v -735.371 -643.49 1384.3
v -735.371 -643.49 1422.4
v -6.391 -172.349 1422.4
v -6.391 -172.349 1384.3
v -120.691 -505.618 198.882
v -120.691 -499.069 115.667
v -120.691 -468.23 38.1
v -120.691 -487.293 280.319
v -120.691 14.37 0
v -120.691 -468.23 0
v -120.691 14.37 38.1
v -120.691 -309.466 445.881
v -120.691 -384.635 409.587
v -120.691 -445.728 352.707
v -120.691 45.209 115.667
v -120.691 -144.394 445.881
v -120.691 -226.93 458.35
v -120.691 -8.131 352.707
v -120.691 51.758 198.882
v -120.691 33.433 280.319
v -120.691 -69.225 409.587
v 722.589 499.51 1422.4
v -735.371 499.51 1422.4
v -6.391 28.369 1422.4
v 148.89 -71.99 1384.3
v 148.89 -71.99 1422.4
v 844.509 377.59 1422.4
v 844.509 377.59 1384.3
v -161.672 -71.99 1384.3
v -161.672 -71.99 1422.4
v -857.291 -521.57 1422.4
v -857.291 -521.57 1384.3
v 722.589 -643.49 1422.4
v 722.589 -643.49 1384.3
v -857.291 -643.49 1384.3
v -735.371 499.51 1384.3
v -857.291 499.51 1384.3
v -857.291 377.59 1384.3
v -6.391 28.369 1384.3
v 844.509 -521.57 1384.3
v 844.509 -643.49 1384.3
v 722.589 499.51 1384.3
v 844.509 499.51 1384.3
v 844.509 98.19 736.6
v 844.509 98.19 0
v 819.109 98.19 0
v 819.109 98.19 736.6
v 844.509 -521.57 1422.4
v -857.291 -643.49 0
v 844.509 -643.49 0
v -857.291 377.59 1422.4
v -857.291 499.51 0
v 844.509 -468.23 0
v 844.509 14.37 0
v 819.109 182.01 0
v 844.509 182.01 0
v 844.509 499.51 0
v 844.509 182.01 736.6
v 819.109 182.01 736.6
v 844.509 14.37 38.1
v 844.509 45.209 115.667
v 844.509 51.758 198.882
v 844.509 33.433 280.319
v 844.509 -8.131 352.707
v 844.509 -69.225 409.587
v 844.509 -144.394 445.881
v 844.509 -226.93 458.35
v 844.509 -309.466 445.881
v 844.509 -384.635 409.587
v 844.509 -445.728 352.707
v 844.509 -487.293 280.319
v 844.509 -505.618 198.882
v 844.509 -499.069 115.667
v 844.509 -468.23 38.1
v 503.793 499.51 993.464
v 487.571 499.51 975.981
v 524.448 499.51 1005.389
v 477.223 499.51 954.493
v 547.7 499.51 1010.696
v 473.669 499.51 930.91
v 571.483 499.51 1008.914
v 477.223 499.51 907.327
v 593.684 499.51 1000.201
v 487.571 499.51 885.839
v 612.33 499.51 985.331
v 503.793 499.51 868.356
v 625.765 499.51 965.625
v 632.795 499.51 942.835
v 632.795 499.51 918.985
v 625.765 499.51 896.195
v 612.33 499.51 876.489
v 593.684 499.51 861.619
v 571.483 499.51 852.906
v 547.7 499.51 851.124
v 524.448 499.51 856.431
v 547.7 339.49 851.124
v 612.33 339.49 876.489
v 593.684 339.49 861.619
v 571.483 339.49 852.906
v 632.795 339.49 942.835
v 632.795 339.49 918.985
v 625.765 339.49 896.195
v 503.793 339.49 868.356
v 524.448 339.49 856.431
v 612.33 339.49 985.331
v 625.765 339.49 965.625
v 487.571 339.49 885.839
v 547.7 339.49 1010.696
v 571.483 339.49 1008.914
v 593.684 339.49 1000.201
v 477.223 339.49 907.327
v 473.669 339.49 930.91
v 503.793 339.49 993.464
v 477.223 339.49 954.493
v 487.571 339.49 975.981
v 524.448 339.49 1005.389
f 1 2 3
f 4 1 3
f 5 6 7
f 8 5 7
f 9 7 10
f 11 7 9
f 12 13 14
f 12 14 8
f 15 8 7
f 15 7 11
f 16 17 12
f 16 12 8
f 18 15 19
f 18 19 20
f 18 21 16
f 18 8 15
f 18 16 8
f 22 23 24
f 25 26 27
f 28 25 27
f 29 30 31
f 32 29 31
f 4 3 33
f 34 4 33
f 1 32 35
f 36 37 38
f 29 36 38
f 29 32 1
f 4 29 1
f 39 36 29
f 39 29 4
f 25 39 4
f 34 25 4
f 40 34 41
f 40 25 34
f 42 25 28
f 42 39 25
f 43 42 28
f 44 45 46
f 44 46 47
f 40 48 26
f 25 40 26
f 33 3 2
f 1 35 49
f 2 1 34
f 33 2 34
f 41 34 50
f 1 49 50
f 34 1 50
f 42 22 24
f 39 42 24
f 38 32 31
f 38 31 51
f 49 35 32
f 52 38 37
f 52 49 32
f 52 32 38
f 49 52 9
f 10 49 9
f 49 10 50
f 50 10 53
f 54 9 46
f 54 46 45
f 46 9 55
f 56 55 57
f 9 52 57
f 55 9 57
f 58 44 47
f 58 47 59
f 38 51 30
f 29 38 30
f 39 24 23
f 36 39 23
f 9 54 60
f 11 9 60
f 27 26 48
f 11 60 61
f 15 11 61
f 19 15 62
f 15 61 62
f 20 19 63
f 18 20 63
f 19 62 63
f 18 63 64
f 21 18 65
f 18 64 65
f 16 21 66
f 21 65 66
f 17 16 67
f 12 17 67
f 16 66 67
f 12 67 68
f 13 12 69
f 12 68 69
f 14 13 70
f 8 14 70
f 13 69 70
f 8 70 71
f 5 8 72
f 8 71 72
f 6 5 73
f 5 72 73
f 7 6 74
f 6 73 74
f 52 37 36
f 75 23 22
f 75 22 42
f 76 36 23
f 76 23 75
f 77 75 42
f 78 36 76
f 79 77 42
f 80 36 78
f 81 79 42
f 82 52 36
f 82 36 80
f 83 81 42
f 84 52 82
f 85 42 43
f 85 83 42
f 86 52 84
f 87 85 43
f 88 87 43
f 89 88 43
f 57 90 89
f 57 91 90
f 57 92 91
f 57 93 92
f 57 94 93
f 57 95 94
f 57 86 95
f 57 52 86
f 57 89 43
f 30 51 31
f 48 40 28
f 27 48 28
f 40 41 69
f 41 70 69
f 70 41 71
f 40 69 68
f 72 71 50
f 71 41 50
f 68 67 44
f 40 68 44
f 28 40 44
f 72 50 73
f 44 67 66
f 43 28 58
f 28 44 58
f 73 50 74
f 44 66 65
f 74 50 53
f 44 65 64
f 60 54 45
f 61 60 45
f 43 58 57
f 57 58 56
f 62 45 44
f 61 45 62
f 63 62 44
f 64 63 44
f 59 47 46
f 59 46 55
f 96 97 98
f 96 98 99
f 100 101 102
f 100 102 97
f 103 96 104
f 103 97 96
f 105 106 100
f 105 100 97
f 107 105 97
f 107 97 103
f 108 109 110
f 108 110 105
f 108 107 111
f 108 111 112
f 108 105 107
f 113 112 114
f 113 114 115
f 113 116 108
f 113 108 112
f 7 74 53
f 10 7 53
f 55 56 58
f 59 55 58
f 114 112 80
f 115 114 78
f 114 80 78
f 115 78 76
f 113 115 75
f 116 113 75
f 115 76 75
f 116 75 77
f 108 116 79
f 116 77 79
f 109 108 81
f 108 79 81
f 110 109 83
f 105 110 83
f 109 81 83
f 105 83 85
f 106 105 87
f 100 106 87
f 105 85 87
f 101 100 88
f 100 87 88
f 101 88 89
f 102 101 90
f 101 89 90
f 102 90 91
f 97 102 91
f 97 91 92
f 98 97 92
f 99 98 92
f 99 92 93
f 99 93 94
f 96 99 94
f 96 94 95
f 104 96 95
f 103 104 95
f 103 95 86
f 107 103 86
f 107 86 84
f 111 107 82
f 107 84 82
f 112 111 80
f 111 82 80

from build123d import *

# Parameters (mm, degrees)
F0_W     = 1701.8
F0_H     = 1143
F1_DEPTH = 1422.4
F2_R     = 80.01
F3_DEPTH = 160.02
F5_DEPTH = 38.1
F6_W     = 83.82
F6_H     = 736.6
F7_DEPTH = 25.4
F9_DEPTH = 965.2


with BuildPart() as f1:
    # F0 (on Top) → F1 (new body)
    with BuildSketch(Plane.XY):
        with Locations((-6.391168, -71.989974)):
            Rectangle(F0_W, F0_H)
    extrude(amount=F1_DEPTH)

    # F2 (on face) → F3 (cut)
    with BuildSketch(Plane(origin=(0, 499.510026, 0), x_dir=(-1, 0, 0), z_dir=(0, 1, 0))):
        with Locations((-553.678832, 930.91)):
            Circle(F2_R)
    extrude(amount=-F3_DEPTH, mode=Mode.SUBTRACT)

    # F4 (on face) → F5 (cut)
    with BuildSketch(Plane.XY.offset(1422.4)):
        Polygon((-857.291168, -643.489974), (-735.371168, -643.489974), (-6.391168, -172.348559), (722.588832, -643.489974), (844.508832, -643.489974), (844.508832, -521.569974), (148.890026, -71.989974), (844.508832, 377.590026), (844.508832, 499.510026), (722.588832, 499.510026), (-6.391168, 28.368612), (-735.371168, 499.510026), (-857.291168, 499.510026), (-857.291168, 377.590026), (-161.672362, -71.989974), (-857.291168, -521.569974), align=None)
    extrude(amount=-F5_DEPTH, mode=Mode.SUBTRACT)

    # F6 (on face) → F7 (cut)
    with BuildSketch(Plane.YZ.offset(844.508832)):
        with Locations((140.100026, 368.3)):
            Rectangle(F6_W, F6_H)
    extrude(amount=-F7_DEPTH, mode=Mode.SUBTRACT)

    # F8 (on face) → F9 (cut)
    with BuildSketch(Plane.YZ.offset(844.508832)):
        with BuildLine():
            Line((14.370026, 0), (14.370026, 38.1))
            ThreePointArc((14.370026, 38.1), (-226.929974, 458.349814), (-468.229974, 38.1))
            Line((-468.229974, 38.1), (-468.229974, 0))
            Line((-468.229974, 0), (14.370026, 0))
        make_face()
    extrude(amount=-F9_DEPTH, mode=Mode.SUBTRACT)


solid = f1.part
